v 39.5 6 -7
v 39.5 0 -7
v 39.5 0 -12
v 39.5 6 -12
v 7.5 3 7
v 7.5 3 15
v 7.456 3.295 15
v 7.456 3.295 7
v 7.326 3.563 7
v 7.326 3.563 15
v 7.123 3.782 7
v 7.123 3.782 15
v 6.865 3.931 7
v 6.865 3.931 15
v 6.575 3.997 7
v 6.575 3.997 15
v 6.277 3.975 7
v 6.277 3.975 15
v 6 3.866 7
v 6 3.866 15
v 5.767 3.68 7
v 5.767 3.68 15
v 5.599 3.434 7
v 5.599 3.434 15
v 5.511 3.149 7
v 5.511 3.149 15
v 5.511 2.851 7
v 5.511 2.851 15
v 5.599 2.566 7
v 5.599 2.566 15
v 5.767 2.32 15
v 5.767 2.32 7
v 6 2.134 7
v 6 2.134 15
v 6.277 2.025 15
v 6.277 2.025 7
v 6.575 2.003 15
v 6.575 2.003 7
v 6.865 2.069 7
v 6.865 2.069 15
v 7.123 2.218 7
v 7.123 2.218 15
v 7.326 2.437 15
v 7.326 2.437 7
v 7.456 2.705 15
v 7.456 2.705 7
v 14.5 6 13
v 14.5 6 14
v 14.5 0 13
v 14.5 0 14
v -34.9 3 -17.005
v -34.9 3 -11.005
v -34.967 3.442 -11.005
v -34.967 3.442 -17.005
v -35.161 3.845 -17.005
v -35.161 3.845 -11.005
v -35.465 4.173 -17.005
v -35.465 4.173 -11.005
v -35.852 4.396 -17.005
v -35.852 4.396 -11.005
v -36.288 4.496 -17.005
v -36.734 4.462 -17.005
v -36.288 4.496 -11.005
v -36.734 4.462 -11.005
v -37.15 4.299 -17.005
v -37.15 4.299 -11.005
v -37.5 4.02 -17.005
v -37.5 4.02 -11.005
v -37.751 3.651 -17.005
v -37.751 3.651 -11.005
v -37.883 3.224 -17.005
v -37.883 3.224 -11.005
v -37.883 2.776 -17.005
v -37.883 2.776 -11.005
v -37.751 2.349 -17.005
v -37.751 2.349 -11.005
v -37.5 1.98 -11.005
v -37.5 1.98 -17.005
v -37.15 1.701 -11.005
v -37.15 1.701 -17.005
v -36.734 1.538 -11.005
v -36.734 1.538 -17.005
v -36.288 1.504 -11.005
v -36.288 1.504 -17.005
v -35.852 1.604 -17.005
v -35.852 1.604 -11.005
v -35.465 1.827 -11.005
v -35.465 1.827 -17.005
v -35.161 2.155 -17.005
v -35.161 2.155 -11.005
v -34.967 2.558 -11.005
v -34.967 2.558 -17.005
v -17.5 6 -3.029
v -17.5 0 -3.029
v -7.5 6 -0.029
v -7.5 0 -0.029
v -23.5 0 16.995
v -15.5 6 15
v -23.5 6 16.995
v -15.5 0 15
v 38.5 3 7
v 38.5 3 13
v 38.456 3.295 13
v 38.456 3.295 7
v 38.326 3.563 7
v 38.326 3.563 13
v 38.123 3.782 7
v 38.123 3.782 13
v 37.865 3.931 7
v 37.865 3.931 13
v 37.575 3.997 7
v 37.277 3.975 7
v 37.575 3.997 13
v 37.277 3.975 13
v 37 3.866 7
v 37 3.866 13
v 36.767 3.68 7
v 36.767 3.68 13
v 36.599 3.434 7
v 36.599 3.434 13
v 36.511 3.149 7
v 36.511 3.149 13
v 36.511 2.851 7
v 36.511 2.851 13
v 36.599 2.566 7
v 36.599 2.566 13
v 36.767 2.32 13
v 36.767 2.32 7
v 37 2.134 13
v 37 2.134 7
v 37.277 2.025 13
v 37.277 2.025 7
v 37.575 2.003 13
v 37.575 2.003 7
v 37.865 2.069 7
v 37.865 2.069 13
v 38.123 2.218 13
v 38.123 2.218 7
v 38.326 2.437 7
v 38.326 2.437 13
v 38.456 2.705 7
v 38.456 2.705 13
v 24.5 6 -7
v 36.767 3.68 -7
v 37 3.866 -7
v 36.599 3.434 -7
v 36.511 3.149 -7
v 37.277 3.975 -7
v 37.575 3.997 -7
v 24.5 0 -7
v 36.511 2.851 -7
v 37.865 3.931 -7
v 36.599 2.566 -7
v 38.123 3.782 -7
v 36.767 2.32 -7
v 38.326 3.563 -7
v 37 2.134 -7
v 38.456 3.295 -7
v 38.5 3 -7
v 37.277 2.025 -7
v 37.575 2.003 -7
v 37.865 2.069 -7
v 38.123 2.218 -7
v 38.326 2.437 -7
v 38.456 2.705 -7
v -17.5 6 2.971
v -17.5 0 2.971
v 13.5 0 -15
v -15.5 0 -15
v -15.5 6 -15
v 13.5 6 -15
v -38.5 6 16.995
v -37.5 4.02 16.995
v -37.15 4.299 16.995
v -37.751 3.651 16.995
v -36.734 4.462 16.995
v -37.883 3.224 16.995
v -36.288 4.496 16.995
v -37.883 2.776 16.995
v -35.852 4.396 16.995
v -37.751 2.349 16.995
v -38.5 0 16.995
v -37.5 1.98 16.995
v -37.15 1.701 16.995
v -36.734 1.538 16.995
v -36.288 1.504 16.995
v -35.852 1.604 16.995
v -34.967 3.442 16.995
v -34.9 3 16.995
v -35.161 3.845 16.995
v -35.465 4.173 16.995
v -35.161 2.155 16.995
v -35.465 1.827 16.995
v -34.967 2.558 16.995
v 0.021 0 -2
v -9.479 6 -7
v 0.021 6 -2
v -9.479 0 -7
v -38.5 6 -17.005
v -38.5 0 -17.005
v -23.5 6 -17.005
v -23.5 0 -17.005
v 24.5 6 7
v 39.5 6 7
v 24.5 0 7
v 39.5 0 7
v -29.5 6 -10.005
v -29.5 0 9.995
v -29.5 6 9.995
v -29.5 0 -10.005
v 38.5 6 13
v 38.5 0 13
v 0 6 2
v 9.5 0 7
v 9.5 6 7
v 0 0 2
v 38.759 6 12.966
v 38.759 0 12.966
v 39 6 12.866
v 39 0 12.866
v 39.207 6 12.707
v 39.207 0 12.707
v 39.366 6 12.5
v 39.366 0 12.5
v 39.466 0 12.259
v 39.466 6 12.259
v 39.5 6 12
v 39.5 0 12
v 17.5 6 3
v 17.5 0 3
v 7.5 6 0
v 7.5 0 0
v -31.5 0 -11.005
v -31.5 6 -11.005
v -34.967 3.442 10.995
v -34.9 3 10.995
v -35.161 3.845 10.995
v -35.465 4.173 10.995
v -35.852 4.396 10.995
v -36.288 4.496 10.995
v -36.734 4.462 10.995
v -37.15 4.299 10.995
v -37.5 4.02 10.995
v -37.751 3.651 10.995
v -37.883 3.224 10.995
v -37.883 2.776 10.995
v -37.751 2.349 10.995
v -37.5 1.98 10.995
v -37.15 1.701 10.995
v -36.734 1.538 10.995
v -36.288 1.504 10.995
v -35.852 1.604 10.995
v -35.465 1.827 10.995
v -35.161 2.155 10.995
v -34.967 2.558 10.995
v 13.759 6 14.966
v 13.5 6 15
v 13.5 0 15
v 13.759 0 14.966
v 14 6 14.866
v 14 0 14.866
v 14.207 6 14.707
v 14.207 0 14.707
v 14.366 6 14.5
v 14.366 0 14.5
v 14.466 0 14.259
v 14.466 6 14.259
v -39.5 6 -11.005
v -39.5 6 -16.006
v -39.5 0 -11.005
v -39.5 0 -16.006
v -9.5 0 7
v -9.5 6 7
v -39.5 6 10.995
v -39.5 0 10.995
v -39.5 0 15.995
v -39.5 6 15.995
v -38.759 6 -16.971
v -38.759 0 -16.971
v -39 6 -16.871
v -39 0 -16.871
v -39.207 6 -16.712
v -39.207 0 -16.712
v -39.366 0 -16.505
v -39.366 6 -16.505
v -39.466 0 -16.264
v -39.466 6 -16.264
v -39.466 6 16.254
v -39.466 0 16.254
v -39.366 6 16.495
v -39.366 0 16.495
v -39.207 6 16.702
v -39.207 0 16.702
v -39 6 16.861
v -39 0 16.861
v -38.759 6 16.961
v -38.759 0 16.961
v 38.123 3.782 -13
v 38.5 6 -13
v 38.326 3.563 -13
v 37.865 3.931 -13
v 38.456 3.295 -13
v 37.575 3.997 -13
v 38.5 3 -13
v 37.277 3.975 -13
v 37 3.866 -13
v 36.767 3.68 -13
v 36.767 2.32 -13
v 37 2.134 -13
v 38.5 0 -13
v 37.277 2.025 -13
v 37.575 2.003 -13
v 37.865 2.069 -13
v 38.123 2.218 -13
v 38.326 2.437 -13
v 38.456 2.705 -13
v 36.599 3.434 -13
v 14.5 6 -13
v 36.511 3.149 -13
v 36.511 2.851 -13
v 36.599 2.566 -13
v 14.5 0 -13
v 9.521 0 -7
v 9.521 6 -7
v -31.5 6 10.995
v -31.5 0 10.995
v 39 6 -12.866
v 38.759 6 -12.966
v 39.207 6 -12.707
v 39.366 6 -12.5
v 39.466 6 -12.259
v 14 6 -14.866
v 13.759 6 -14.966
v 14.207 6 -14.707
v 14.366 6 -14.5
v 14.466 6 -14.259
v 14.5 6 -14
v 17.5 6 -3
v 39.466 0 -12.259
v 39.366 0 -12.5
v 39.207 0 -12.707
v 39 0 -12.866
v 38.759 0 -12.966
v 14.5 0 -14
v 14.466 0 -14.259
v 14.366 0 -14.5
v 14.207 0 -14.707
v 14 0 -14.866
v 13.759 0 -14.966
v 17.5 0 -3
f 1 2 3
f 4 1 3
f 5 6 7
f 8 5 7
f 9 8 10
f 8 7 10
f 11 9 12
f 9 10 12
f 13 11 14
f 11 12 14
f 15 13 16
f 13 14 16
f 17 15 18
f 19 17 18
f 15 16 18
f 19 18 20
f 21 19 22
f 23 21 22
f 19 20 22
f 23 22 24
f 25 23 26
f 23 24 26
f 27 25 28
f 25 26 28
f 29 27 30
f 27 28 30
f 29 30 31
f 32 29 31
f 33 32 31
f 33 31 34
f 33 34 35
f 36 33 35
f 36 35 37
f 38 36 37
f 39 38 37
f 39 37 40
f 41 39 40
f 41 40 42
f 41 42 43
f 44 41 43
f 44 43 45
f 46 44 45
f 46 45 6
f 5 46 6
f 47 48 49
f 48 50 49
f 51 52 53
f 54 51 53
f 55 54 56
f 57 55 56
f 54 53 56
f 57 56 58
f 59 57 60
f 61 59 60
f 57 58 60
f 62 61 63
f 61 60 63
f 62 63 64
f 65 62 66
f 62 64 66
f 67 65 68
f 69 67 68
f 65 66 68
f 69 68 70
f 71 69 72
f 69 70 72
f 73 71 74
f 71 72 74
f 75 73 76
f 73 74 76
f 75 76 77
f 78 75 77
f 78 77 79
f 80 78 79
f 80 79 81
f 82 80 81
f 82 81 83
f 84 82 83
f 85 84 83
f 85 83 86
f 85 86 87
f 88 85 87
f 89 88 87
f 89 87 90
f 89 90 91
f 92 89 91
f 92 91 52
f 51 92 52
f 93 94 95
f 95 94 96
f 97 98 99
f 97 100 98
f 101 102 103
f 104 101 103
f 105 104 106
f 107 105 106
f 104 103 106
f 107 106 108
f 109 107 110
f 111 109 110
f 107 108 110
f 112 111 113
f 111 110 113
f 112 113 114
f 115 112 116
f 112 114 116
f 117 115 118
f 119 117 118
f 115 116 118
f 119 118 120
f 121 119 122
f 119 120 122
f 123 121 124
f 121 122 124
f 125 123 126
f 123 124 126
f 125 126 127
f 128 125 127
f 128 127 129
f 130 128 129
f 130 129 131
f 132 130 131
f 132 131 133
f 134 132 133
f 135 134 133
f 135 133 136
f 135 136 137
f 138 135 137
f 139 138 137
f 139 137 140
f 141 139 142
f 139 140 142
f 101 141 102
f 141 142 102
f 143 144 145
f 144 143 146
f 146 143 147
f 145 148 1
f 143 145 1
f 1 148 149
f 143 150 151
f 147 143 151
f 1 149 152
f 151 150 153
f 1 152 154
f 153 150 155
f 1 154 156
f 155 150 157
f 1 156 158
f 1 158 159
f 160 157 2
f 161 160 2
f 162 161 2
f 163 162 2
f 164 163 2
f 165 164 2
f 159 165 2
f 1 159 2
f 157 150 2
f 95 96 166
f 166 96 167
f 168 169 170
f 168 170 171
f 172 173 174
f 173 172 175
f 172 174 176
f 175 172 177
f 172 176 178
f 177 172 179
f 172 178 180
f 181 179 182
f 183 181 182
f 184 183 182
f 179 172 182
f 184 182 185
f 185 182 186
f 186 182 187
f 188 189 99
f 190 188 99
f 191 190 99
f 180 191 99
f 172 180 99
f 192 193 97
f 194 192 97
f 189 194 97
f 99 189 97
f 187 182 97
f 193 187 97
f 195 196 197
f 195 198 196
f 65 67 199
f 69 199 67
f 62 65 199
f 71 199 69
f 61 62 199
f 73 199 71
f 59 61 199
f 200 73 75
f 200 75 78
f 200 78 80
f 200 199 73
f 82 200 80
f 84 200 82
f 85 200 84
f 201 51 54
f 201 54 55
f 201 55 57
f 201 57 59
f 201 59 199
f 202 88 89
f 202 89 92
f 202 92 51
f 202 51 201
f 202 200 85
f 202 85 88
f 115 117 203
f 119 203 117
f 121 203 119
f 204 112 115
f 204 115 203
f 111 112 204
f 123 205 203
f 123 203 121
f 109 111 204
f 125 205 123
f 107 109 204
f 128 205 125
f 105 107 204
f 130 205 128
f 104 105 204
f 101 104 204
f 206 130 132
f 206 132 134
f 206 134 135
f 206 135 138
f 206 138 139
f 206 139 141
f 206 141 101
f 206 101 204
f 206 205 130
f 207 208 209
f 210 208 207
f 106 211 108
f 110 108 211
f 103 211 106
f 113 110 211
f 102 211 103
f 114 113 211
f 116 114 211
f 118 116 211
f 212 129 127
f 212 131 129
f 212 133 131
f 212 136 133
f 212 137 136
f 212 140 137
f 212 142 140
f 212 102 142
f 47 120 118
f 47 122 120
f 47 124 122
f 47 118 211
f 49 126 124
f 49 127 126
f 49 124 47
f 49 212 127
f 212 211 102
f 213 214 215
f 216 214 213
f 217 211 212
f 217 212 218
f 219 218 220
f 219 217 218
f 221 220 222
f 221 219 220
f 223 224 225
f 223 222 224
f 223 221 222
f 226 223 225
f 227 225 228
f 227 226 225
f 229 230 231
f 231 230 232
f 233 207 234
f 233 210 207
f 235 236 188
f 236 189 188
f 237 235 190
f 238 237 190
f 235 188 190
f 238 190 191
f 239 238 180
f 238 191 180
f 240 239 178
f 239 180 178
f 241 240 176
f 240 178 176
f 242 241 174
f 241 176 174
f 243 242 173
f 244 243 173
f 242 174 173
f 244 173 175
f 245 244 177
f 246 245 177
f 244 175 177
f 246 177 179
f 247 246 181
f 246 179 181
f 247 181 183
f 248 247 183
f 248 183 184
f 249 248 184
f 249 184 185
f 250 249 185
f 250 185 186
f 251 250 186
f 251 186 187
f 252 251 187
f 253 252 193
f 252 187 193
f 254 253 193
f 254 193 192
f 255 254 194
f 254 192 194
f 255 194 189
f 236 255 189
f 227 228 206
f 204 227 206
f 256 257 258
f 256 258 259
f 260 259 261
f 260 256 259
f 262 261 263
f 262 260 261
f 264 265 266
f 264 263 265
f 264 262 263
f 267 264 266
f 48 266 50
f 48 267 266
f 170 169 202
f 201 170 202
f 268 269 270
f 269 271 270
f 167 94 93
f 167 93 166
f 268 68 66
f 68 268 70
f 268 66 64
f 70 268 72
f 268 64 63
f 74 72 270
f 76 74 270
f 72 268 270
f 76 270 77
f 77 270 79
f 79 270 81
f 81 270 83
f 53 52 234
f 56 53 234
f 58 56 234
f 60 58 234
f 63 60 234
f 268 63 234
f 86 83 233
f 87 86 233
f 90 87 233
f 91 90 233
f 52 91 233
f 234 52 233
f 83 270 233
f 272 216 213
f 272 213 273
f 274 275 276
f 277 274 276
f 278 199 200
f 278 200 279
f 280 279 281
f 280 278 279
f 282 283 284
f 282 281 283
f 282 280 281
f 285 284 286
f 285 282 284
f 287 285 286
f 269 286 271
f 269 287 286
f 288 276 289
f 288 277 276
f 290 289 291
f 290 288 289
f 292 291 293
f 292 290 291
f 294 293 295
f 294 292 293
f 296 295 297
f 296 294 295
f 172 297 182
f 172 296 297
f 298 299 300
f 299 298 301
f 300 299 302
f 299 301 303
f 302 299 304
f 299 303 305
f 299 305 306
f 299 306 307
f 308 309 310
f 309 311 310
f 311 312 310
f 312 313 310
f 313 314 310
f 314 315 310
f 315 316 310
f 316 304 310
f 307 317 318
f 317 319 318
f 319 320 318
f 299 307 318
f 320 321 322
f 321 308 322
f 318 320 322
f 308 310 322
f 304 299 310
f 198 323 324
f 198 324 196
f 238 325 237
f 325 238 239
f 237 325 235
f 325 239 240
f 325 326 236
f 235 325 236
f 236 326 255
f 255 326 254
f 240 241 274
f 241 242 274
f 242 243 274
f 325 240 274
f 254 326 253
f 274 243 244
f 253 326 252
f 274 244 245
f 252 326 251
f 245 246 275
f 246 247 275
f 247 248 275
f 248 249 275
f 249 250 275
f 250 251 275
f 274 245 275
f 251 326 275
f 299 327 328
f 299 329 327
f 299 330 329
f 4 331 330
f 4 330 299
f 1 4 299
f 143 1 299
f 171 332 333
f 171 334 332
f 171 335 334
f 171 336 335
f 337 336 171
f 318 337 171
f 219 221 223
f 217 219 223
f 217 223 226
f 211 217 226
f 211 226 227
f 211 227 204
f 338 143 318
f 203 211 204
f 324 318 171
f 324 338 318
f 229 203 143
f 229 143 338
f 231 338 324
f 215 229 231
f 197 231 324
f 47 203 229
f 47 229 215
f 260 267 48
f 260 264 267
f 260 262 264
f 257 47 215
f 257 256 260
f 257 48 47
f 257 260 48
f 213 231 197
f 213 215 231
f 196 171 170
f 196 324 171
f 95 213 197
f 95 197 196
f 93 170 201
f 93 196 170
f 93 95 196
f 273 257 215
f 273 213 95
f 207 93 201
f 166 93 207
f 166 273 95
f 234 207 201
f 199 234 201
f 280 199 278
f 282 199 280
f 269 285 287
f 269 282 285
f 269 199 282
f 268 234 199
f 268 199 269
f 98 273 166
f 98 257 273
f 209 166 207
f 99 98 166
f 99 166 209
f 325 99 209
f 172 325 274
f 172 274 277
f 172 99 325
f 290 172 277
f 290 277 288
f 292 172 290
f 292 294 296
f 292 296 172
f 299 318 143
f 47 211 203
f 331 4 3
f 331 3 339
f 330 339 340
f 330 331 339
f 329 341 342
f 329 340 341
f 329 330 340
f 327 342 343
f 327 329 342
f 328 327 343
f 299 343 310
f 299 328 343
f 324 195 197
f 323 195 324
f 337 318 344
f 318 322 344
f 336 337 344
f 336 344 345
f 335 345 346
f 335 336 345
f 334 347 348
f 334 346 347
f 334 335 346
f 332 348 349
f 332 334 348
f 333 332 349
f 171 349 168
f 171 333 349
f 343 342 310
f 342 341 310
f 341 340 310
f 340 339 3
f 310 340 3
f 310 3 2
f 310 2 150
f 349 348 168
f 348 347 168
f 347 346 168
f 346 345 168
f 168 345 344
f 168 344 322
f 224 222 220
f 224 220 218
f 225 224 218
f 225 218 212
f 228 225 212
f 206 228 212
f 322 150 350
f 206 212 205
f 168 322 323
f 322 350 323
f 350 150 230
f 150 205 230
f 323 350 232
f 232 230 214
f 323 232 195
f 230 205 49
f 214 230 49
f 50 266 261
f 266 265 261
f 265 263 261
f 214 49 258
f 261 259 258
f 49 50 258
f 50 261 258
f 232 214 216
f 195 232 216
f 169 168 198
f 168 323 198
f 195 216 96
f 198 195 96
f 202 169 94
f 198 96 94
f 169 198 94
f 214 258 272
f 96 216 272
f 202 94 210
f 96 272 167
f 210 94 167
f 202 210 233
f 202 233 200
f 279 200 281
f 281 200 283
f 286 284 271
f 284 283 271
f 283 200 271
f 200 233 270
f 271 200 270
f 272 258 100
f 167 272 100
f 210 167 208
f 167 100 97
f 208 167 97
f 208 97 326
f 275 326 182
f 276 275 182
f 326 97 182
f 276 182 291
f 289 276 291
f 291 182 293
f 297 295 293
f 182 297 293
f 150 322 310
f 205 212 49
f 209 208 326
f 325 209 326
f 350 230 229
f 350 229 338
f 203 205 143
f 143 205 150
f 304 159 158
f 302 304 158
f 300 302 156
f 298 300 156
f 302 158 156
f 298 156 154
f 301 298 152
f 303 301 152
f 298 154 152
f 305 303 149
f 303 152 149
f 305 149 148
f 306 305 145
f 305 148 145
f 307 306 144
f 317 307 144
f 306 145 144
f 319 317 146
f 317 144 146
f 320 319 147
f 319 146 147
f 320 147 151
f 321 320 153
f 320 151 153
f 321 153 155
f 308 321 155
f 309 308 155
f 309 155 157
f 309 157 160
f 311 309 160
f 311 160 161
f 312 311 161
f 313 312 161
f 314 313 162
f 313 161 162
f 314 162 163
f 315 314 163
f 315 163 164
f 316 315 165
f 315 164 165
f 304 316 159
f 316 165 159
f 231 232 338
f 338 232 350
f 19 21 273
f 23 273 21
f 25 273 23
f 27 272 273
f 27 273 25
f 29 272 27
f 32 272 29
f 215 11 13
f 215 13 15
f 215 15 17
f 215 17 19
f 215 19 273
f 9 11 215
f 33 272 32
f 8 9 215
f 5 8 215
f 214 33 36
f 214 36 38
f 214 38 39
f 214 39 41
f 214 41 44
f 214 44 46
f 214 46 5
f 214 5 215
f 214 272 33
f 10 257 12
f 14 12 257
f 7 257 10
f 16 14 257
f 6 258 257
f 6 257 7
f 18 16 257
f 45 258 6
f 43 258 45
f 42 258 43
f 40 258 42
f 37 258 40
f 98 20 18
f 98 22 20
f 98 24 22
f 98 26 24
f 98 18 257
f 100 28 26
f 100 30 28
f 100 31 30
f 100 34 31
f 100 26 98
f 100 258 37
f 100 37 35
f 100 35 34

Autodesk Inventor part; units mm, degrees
ref_plane "YZ Plane" through (0, 0, 0) normal (1, 0, 0) x (0, 1, 0)
ref_plane "XZ Plane" through (0, 0, 0) normal (0, 1, 0) x (-1, 0, 0)
ref_plane "XY Plane" through (0, 0, 0) normal (0, 0, 1) x (1, 0, 0)
sketch "Sketch1" plane through (0, 0, 0) normal (0, 1, 0) x (-1, 0, 0)
  line L0 (39.5, 16.9949) -> (118.5, 16.9949) construction
  line L1 (31.5, 10.9949) -> (39.5, 10.9949)
  line L2 (39.5, -11.0051) -> (31.5, -11.0051)
  line L3 (29.5, -10.0051) -> (31.5, -11.0051)
  line L4 (29.5, 9.9949) -> (31.5, 10.9949)
  line L5 (29.5, 9.9949) -> (29.5, -10.0051)
  line L6 (39.5, -17.0051) -> (39.5, -11.0051)
  line L7 (39.5, 10.9949) -> (39.5, 16.9949)
  line L8 (-14.5, 15) -> (15.5, 15)
  line L9 (15.5, -15) -> (-14.5, -15)
  line L10 (15.5, 15) -> (23.5, 16.9949)
  line L11 (15.5, -15) -> (23.5, -17.0051)
  line L12 (39.5, -17.0051) -> (23.5, -17.0051)
  line L13 (39.5, 16.9949) -> (23.5, 16.9949)
  line L14 (-39.5, 13) -> (-14.5, 13)
  line L15 (-39.5, -13) -> (-14.5, -13)
  line L16 (-24.5, 7) -> (-24.5, -7)
  line L17 (-24.5, 7) -> (-39.5, 7)
  line L18 (-24.5, -7) -> (-39.5, -7)
  line L19 (-39.5, 13) -> (-39.5, 7)
  line L20 (-39.5, -7) -> (-39.5, -13)
  line L21 (-17.5, 3) -> (-17.5, -3)
  line L22 (-17.5, 3) -> (-7.5, 0)
  line L23 (-7.5, 0) -> (-17.5, -3)
  line L24 (-14.5, 15) -> (-14.5, 13)
  line L25 (-14.5, -13) -> (-14.5, -15)
  line L26 (17.5, -3.0294) -> (17.5, 2.9706)
  line L27 (17.5, -3.0294) -> (7.5, -0.0294)
  line L28 (7.5, -0.0294) -> (17.5, 2.9706)
  line L29 (9.5, 7) -> (-9.5, 7)
  line L30 (0, 2) -> (9.5, 7)
  line L31 (-9.5, 7) -> (0, 2)
  line L32 (-9.5209, -7) -> (9.4791, -7)
  line L33 (-0.0209, -2) -> (-9.5209, -7)
  line L34 (9.4791, -7) -> (-0.0209, -2)
  point P0 (0, 0)
  point P1 (39.5, 13.9949)
  point P2 (-17.5, 0)
  point P3 (17.5, -0.0294)
  point P4 (-14.7945, 6.659)
  point P5 (-14.2279, -6.5477)
  point P6 (0, 7)
  point P7 (0, 7)
  dimension "d18" = 10
  dimension "d21" = 6
  dimension "d22" = 6
  dimension "d26" = 7
  dimension "d27" = 10
  dimension "d28" = 3
  dimension "d29" = 3
  dimension "d30" = 10
  dimension "d31" = 3
  dimension "d32" = 3
extrude "Extrusion1" add sketch "Sketch1" along normal blind 6
sketch "Sketch2" plane through (14.5, 0, 13) normal (0, 0, 1) x (1, 0, 0)
  line L0 (0, 6) -> (25, 6) projected
  line L1 (25, 0) -> (25, 6) projected
  circle A0 centre (23, 3) radius 1
  point P0 (-14.5, 0)
  point P1 (25, 3)
  dimension "d45" = 2
extrude "Extrusion2" cut sketch "Sketch2" against normal blind 40
sketch "Sketch3" plane through (-39.5, 0, 16.9949) normal (0, 0, 1) x (1, 0, 0)
  line L0 (8, 6) -> (0, 6) projected
  line L1 (0, 0) -> (0, 6) projected
  circle A0 centre (3.1, 3) radius 1.5
  point P0 (39.5, 0)
  dimension "d49" = 3
extrude "Extrusion3" cut sketch "Sketch3" against normal blind 40
fillet "Fillet1" radius 1 6 edges at (39.5, 3, -13) (14.5, 3, -15) (-39.5, 3, -17.0051) (39.5, 3, 13) (14.5, 3, 15) (-39.5, 3, 16.9949)
sketch "Sketch4" plane through (-15.5, 0, 15) normal (0, 0, 1) x (1, 0, 0)
  line L0 (-24, 0) -> (-24, 6)
  circle A0 centre (22, 3) radius 1
  point P0 (15.5, 0)
  dimension "d56" = 2
extrude "Extrusion4" cut sketch "Sketch4" against normal blind 8
properties part number "PX9200-10"
